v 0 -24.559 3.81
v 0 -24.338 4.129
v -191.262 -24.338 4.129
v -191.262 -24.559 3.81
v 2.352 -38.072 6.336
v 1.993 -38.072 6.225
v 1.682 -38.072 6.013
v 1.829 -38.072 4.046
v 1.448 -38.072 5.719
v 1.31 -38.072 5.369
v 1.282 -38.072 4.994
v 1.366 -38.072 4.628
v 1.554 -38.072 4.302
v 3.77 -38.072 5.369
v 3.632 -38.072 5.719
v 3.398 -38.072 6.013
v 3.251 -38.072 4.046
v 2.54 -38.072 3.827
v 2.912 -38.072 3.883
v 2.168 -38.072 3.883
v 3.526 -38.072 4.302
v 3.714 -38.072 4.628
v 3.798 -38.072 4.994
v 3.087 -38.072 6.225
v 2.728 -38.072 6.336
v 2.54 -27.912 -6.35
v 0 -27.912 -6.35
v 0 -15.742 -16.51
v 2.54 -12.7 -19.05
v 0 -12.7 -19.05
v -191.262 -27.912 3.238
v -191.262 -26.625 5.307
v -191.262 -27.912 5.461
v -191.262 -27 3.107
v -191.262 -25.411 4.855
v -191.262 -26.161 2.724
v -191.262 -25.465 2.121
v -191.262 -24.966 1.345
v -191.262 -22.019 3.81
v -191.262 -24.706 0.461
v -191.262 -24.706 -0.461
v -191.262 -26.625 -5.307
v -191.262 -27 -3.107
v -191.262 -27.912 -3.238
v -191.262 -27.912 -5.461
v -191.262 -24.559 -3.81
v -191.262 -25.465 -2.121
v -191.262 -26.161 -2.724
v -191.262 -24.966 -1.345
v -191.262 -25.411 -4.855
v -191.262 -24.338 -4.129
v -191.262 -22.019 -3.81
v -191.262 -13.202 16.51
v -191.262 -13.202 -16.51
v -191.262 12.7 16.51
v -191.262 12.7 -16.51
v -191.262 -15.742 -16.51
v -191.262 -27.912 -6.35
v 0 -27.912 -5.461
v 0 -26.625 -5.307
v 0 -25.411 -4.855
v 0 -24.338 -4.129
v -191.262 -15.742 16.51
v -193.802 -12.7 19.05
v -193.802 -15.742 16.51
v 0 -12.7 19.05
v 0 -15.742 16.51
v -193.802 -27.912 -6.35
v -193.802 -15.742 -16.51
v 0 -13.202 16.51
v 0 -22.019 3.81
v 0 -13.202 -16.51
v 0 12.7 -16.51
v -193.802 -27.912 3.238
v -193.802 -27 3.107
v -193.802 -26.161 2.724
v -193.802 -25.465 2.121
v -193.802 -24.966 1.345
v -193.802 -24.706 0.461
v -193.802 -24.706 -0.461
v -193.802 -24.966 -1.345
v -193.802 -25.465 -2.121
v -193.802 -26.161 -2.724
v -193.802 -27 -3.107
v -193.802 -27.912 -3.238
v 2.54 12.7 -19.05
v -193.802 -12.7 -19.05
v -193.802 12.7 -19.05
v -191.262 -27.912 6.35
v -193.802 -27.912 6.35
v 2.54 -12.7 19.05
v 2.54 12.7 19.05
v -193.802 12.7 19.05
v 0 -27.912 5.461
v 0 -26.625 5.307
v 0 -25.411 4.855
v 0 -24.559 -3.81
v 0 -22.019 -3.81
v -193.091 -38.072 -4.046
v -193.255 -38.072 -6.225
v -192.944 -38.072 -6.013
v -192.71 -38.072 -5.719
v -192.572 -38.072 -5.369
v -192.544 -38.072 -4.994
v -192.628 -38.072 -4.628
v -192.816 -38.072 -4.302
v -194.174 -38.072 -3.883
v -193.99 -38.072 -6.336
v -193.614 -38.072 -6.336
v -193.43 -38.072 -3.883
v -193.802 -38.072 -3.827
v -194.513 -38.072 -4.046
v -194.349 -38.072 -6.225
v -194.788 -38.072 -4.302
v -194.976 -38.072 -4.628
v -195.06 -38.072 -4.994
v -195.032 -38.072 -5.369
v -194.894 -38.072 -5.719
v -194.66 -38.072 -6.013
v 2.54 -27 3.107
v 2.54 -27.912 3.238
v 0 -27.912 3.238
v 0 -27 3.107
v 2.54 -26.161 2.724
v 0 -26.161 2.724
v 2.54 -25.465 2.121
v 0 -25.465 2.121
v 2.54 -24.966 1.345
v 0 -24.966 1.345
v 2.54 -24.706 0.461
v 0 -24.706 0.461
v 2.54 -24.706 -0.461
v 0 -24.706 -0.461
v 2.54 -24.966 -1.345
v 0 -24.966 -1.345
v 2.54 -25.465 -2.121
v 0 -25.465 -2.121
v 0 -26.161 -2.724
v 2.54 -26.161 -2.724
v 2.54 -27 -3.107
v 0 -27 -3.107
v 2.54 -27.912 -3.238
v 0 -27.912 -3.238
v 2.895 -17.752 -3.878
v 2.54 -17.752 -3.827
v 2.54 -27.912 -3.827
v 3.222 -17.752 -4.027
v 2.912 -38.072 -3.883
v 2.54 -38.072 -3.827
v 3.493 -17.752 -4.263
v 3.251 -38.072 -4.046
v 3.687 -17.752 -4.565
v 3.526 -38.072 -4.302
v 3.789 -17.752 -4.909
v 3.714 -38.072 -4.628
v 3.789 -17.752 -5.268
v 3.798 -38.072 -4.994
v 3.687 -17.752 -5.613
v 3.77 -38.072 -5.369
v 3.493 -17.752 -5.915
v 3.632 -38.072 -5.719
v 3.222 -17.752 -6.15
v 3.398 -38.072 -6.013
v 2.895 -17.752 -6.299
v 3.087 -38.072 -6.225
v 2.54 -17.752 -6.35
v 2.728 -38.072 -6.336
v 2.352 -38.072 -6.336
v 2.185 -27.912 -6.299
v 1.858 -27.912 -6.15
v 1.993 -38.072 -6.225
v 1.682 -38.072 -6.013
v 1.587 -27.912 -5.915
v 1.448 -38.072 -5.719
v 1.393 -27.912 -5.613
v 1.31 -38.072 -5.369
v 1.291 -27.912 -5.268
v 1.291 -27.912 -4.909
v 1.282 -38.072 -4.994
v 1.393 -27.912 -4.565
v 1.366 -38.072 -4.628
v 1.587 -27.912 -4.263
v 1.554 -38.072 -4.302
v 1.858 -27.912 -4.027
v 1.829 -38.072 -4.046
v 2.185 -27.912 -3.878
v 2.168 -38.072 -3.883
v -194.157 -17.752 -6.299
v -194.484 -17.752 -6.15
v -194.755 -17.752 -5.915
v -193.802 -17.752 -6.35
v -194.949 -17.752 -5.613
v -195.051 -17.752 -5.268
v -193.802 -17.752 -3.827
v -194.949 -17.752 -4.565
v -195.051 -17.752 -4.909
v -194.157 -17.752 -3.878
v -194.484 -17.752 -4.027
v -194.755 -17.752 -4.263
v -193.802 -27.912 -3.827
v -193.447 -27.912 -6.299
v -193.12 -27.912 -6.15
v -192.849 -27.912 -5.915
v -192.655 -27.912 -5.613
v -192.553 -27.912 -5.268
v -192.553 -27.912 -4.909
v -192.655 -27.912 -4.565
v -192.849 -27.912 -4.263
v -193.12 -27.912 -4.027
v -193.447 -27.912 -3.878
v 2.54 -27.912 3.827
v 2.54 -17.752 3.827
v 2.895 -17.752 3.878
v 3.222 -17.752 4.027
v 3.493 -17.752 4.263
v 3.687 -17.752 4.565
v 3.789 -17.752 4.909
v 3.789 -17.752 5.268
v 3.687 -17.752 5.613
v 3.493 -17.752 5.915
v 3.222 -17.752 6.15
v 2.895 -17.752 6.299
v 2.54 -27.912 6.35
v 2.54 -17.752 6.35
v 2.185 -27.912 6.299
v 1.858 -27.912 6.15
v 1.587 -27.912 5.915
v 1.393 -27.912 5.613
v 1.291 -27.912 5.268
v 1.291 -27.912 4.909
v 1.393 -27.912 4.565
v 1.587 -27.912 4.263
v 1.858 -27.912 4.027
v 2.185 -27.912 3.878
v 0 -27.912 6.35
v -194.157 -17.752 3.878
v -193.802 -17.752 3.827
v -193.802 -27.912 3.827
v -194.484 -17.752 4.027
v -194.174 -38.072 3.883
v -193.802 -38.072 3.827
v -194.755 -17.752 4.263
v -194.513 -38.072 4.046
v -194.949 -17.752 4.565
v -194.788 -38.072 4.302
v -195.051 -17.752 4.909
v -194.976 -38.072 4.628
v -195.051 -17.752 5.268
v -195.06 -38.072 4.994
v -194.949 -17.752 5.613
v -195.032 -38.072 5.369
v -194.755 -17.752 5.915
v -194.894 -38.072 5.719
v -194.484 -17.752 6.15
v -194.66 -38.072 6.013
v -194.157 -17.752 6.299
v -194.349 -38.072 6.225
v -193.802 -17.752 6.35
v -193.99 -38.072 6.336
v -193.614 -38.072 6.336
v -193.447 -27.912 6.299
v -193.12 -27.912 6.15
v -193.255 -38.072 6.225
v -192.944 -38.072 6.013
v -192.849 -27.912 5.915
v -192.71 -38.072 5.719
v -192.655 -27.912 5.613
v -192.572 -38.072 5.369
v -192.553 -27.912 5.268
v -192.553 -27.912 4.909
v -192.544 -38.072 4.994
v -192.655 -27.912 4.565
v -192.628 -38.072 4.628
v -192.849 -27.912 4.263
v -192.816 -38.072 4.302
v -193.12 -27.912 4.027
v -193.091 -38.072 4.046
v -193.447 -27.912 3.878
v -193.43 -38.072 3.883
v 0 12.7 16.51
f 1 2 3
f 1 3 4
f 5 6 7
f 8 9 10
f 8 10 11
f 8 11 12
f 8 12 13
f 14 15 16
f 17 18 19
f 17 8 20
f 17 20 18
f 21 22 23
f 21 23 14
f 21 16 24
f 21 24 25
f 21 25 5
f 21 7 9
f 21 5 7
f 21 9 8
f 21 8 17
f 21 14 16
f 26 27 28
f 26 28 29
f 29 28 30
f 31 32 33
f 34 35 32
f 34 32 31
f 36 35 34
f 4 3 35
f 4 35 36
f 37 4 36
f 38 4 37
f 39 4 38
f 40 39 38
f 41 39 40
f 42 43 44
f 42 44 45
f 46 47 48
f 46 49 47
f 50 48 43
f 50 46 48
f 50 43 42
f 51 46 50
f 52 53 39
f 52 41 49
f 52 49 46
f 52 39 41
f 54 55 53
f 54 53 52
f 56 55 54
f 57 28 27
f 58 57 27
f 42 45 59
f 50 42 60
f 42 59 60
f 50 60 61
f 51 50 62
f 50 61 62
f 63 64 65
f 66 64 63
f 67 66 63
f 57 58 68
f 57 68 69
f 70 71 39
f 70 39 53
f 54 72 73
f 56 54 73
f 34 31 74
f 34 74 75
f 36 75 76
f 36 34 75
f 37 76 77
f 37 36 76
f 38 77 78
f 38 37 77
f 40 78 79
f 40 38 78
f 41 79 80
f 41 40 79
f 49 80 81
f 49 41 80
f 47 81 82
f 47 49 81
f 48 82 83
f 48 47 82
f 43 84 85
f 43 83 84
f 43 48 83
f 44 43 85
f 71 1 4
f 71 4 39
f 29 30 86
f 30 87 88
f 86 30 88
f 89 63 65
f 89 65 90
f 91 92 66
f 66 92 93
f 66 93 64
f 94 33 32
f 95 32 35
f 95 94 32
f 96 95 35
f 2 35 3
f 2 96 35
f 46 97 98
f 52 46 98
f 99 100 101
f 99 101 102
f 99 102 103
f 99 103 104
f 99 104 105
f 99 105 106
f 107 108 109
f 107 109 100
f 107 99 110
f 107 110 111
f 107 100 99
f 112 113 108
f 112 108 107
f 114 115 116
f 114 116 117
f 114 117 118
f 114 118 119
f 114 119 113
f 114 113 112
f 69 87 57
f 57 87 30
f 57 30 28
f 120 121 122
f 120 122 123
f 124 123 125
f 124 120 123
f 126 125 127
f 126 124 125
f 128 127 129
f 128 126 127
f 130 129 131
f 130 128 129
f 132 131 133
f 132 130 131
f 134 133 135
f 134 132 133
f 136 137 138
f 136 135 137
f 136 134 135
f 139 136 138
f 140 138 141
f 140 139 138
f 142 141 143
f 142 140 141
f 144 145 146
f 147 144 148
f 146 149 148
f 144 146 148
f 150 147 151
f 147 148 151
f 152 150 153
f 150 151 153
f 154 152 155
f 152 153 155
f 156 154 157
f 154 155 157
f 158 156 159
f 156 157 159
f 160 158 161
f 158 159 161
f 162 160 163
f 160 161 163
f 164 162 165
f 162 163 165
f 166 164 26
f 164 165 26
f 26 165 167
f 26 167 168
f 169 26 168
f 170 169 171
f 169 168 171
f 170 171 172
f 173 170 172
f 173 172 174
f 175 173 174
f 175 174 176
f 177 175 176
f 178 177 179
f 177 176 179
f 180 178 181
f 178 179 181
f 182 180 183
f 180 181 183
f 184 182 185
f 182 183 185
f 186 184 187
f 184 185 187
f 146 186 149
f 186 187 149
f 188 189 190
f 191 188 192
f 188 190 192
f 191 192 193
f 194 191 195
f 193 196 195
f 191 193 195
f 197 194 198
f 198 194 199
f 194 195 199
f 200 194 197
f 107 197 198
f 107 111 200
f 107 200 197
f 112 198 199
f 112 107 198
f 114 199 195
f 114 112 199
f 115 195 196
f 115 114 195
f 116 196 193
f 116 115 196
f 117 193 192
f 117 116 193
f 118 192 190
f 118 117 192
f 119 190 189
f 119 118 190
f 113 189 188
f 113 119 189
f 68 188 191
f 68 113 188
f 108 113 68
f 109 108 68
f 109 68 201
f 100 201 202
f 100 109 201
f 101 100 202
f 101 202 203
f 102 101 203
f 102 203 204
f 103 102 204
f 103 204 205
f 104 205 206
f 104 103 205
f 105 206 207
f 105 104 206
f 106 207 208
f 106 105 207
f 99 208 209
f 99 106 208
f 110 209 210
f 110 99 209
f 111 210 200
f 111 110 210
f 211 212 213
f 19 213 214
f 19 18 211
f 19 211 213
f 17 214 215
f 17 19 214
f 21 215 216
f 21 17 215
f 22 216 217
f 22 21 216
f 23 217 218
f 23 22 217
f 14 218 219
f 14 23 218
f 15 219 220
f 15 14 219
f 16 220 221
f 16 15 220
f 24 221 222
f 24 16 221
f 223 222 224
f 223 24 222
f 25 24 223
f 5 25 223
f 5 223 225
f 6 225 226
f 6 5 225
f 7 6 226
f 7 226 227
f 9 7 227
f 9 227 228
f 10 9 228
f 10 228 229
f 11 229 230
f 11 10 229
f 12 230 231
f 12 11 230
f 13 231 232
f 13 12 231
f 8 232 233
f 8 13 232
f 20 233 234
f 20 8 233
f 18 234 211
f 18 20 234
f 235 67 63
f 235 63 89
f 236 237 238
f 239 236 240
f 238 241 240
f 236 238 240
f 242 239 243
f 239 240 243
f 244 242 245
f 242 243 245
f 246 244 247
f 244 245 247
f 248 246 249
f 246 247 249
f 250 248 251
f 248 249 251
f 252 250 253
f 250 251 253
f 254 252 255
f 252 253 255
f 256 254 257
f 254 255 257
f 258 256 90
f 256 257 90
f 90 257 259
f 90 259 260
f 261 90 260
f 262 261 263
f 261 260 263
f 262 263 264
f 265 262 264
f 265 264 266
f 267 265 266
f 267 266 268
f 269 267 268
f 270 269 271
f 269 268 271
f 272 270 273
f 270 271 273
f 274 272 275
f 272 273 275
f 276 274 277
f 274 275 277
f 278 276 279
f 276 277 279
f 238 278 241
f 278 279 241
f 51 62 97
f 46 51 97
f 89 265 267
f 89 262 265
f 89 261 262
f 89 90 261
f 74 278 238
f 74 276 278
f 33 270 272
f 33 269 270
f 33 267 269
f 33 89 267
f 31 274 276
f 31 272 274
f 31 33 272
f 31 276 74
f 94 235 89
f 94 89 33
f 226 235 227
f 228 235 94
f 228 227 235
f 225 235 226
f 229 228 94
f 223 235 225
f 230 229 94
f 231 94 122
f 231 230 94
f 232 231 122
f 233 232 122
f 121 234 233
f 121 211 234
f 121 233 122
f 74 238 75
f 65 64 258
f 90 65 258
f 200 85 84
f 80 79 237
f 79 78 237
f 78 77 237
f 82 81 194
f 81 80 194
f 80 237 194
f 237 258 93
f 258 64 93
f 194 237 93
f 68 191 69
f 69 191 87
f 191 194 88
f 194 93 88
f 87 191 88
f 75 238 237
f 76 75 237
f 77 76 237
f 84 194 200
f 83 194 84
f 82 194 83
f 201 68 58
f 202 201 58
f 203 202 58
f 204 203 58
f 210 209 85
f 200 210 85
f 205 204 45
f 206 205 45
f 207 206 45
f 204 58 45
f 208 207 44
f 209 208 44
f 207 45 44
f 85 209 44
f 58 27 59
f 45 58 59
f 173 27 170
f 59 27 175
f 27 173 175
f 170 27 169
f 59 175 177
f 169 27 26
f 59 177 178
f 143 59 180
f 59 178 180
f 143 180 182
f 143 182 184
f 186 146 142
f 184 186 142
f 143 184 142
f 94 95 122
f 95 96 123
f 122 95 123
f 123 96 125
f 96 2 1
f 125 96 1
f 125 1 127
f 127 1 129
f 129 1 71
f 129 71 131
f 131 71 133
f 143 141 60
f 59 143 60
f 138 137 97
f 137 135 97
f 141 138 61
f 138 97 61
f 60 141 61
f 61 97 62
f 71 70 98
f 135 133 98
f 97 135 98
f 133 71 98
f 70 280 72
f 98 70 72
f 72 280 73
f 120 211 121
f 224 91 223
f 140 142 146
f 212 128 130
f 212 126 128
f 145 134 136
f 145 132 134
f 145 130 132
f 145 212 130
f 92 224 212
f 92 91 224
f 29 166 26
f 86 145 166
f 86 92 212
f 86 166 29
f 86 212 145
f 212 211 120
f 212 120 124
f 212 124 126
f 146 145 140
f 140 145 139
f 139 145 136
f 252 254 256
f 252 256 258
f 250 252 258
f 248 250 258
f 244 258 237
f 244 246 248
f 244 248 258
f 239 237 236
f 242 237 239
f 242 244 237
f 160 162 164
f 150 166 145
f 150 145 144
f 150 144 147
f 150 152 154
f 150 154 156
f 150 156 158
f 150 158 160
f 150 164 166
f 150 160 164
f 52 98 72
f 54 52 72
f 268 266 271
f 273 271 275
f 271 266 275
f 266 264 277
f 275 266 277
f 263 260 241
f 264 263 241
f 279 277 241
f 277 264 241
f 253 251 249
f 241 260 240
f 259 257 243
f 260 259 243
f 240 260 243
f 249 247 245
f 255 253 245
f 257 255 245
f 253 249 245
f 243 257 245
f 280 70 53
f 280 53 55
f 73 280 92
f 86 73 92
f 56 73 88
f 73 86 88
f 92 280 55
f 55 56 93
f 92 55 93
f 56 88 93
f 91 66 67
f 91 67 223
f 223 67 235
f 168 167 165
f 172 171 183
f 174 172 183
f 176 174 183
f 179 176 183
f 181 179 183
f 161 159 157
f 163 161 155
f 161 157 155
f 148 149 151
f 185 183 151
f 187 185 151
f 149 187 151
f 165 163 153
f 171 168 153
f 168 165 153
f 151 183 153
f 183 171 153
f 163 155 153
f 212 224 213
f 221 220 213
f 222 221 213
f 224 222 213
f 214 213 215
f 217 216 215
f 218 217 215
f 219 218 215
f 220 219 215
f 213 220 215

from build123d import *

# Parameters (mm, degrees)
BOSS_EXTRUDE1_DEPTH      = 2.54
BOSS_EXTRUDE2_DEPTH      = 196.342
CUT_EXTRUDE2_DEPTH       = 200.22892422
CUT_EXTRUDE2_DEPTH_BACK  = 200.22892422
SKETCH6_R                = 3.2385
SKETCH9_R                = 1.261392003
BOSS_EXTRUDE5_DEPTH      = 10.16
MIRROR11_COPY_1_SKETCH_R = 1.261392003
MIRROR11_COPY_1_DEPTH    = 10.16
BOSS_EXTRUDE6_DEPTH      = 191.262


with BuildPart() as part:
    # Sketch2 → Boss-Extrude1 (new body)
    with BuildSketch(Plane(origin=(0, 0, 0), x_dir=(0, 0, -1), z_dir=(1, 0, 0))):
        Polygon((-19.05, -12.7), (-6.35, -27.912018594), (6.35, -27.912018594), (19.05, -12.7), (19.05, 12.7), (-19.05, 12.7), align=None)
    boss_extrude1 = extrude(amount=BOSS_EXTRUDE1_DEPTH)

    # Sketch3 → Boss-Extrude2 (add)
    with BuildSketch(Plane(origin=(2.54, 0, 0), x_dir=(0, 0, -1), z_dir=(1, 0, 0))):
        Polygon((16.51, -13.202403719), (16.51, 12.7), (19.05, 12.7), (19.05, -12.7), (16.51, -15.742403719), (3.81, -24.559218594), (3.81, -22.019218594), align=None)
    boss_extrude2 = extrude(amount=-BOSS_EXTRUDE2_DEPTH)

    # Mirror1: Boss-Extrude2 across plane
    add(boss_extrude2.mirror(Plane.XY))

    # Mirror3: Boss-Extrude1 across plane
    add(boss_extrude1.mirror(Plane(origin=(-95.631, 0, 0), x_dir=(0, 0, 1), z_dir=(1, 0, 0))))

    # Sketch6 → Cut-Extrude2 (cut, two sides: drawn at the far end of the back side and taken through both)
    with BuildSketch(Plane.ZY.offset(193.802).offset(-CUT_EXTRUDE2_DEPTH_BACK)):
        with Locations((0, -27.912018594)):
            Circle(SKETCH6_R)
    extrude(amount=CUT_EXTRUDE2_DEPTH + CUT_EXTRUDE2_DEPTH_BACK, mode=Mode.SUBTRACT)

    # Sketch9 → Boss-Extrude5 (add, symmetric)
    with BuildSketch(Plane.XZ.offset(27.912018594)):
        with Locations(Location((2.54, 5.088607997, 0), (0, 0, 270))):
            Circle(SKETCH9_R)
    boss_extrude5 = extrude(amount=BOSS_EXTRUDE5_DEPTH, both=True)

    # Mirror10: Boss-Extrude5 across plane
    add(boss_extrude5.mirror(Plane(origin=(-95.631, 0, 0), x_dir=(0, 0, 1), z_dir=(1, 0, 0))))

    # Mirror11: Boss-Extrude5 across plane
    add(boss_extrude5.mirror(Plane.XY))

    # Mirror11 copy 1 sketch → Mirror11 copy 1 (add, symmetric)
    with BuildSketch(Plane(origin=(-191.262, -27.912018594, 0), x_dir=(-1, 0, 0), z_dir=(0, -1, 0))):
        with Locations(Location((2.54, 5.088607997, 0), (0, 0, 270))):
            Circle(MIRROR11_COPY_1_SKETCH_R)
    extrude(amount=MIRROR11_COPY_1_DEPTH, both=True)

    # Sketch10 → Boss-Extrude6 (add)
    with BuildSketch(Plane.ZY):
        with BuildLine():
            Line((-4.128889044, -24.337833896), (-16.51, -15.742403719))
            Line((-16.51, -15.742403719), (-6.35, -27.912018594))
            Line((-6.35, -27.912018594), (-5.461, -27.912018594))
            ThreePointArc((-5.461, -27.912018594), (-5.117146865, -26.004840322), (-4.128889044, -24.337833896))
        make_face()
    boss_extrude6 = extrude(amount=BOSS_EXTRUDE6_DEPTH)

    # Mirror12: Boss-Extrude6 across plane
    add(boss_extrude6.mirror(Plane.XY))


solid = part.part
